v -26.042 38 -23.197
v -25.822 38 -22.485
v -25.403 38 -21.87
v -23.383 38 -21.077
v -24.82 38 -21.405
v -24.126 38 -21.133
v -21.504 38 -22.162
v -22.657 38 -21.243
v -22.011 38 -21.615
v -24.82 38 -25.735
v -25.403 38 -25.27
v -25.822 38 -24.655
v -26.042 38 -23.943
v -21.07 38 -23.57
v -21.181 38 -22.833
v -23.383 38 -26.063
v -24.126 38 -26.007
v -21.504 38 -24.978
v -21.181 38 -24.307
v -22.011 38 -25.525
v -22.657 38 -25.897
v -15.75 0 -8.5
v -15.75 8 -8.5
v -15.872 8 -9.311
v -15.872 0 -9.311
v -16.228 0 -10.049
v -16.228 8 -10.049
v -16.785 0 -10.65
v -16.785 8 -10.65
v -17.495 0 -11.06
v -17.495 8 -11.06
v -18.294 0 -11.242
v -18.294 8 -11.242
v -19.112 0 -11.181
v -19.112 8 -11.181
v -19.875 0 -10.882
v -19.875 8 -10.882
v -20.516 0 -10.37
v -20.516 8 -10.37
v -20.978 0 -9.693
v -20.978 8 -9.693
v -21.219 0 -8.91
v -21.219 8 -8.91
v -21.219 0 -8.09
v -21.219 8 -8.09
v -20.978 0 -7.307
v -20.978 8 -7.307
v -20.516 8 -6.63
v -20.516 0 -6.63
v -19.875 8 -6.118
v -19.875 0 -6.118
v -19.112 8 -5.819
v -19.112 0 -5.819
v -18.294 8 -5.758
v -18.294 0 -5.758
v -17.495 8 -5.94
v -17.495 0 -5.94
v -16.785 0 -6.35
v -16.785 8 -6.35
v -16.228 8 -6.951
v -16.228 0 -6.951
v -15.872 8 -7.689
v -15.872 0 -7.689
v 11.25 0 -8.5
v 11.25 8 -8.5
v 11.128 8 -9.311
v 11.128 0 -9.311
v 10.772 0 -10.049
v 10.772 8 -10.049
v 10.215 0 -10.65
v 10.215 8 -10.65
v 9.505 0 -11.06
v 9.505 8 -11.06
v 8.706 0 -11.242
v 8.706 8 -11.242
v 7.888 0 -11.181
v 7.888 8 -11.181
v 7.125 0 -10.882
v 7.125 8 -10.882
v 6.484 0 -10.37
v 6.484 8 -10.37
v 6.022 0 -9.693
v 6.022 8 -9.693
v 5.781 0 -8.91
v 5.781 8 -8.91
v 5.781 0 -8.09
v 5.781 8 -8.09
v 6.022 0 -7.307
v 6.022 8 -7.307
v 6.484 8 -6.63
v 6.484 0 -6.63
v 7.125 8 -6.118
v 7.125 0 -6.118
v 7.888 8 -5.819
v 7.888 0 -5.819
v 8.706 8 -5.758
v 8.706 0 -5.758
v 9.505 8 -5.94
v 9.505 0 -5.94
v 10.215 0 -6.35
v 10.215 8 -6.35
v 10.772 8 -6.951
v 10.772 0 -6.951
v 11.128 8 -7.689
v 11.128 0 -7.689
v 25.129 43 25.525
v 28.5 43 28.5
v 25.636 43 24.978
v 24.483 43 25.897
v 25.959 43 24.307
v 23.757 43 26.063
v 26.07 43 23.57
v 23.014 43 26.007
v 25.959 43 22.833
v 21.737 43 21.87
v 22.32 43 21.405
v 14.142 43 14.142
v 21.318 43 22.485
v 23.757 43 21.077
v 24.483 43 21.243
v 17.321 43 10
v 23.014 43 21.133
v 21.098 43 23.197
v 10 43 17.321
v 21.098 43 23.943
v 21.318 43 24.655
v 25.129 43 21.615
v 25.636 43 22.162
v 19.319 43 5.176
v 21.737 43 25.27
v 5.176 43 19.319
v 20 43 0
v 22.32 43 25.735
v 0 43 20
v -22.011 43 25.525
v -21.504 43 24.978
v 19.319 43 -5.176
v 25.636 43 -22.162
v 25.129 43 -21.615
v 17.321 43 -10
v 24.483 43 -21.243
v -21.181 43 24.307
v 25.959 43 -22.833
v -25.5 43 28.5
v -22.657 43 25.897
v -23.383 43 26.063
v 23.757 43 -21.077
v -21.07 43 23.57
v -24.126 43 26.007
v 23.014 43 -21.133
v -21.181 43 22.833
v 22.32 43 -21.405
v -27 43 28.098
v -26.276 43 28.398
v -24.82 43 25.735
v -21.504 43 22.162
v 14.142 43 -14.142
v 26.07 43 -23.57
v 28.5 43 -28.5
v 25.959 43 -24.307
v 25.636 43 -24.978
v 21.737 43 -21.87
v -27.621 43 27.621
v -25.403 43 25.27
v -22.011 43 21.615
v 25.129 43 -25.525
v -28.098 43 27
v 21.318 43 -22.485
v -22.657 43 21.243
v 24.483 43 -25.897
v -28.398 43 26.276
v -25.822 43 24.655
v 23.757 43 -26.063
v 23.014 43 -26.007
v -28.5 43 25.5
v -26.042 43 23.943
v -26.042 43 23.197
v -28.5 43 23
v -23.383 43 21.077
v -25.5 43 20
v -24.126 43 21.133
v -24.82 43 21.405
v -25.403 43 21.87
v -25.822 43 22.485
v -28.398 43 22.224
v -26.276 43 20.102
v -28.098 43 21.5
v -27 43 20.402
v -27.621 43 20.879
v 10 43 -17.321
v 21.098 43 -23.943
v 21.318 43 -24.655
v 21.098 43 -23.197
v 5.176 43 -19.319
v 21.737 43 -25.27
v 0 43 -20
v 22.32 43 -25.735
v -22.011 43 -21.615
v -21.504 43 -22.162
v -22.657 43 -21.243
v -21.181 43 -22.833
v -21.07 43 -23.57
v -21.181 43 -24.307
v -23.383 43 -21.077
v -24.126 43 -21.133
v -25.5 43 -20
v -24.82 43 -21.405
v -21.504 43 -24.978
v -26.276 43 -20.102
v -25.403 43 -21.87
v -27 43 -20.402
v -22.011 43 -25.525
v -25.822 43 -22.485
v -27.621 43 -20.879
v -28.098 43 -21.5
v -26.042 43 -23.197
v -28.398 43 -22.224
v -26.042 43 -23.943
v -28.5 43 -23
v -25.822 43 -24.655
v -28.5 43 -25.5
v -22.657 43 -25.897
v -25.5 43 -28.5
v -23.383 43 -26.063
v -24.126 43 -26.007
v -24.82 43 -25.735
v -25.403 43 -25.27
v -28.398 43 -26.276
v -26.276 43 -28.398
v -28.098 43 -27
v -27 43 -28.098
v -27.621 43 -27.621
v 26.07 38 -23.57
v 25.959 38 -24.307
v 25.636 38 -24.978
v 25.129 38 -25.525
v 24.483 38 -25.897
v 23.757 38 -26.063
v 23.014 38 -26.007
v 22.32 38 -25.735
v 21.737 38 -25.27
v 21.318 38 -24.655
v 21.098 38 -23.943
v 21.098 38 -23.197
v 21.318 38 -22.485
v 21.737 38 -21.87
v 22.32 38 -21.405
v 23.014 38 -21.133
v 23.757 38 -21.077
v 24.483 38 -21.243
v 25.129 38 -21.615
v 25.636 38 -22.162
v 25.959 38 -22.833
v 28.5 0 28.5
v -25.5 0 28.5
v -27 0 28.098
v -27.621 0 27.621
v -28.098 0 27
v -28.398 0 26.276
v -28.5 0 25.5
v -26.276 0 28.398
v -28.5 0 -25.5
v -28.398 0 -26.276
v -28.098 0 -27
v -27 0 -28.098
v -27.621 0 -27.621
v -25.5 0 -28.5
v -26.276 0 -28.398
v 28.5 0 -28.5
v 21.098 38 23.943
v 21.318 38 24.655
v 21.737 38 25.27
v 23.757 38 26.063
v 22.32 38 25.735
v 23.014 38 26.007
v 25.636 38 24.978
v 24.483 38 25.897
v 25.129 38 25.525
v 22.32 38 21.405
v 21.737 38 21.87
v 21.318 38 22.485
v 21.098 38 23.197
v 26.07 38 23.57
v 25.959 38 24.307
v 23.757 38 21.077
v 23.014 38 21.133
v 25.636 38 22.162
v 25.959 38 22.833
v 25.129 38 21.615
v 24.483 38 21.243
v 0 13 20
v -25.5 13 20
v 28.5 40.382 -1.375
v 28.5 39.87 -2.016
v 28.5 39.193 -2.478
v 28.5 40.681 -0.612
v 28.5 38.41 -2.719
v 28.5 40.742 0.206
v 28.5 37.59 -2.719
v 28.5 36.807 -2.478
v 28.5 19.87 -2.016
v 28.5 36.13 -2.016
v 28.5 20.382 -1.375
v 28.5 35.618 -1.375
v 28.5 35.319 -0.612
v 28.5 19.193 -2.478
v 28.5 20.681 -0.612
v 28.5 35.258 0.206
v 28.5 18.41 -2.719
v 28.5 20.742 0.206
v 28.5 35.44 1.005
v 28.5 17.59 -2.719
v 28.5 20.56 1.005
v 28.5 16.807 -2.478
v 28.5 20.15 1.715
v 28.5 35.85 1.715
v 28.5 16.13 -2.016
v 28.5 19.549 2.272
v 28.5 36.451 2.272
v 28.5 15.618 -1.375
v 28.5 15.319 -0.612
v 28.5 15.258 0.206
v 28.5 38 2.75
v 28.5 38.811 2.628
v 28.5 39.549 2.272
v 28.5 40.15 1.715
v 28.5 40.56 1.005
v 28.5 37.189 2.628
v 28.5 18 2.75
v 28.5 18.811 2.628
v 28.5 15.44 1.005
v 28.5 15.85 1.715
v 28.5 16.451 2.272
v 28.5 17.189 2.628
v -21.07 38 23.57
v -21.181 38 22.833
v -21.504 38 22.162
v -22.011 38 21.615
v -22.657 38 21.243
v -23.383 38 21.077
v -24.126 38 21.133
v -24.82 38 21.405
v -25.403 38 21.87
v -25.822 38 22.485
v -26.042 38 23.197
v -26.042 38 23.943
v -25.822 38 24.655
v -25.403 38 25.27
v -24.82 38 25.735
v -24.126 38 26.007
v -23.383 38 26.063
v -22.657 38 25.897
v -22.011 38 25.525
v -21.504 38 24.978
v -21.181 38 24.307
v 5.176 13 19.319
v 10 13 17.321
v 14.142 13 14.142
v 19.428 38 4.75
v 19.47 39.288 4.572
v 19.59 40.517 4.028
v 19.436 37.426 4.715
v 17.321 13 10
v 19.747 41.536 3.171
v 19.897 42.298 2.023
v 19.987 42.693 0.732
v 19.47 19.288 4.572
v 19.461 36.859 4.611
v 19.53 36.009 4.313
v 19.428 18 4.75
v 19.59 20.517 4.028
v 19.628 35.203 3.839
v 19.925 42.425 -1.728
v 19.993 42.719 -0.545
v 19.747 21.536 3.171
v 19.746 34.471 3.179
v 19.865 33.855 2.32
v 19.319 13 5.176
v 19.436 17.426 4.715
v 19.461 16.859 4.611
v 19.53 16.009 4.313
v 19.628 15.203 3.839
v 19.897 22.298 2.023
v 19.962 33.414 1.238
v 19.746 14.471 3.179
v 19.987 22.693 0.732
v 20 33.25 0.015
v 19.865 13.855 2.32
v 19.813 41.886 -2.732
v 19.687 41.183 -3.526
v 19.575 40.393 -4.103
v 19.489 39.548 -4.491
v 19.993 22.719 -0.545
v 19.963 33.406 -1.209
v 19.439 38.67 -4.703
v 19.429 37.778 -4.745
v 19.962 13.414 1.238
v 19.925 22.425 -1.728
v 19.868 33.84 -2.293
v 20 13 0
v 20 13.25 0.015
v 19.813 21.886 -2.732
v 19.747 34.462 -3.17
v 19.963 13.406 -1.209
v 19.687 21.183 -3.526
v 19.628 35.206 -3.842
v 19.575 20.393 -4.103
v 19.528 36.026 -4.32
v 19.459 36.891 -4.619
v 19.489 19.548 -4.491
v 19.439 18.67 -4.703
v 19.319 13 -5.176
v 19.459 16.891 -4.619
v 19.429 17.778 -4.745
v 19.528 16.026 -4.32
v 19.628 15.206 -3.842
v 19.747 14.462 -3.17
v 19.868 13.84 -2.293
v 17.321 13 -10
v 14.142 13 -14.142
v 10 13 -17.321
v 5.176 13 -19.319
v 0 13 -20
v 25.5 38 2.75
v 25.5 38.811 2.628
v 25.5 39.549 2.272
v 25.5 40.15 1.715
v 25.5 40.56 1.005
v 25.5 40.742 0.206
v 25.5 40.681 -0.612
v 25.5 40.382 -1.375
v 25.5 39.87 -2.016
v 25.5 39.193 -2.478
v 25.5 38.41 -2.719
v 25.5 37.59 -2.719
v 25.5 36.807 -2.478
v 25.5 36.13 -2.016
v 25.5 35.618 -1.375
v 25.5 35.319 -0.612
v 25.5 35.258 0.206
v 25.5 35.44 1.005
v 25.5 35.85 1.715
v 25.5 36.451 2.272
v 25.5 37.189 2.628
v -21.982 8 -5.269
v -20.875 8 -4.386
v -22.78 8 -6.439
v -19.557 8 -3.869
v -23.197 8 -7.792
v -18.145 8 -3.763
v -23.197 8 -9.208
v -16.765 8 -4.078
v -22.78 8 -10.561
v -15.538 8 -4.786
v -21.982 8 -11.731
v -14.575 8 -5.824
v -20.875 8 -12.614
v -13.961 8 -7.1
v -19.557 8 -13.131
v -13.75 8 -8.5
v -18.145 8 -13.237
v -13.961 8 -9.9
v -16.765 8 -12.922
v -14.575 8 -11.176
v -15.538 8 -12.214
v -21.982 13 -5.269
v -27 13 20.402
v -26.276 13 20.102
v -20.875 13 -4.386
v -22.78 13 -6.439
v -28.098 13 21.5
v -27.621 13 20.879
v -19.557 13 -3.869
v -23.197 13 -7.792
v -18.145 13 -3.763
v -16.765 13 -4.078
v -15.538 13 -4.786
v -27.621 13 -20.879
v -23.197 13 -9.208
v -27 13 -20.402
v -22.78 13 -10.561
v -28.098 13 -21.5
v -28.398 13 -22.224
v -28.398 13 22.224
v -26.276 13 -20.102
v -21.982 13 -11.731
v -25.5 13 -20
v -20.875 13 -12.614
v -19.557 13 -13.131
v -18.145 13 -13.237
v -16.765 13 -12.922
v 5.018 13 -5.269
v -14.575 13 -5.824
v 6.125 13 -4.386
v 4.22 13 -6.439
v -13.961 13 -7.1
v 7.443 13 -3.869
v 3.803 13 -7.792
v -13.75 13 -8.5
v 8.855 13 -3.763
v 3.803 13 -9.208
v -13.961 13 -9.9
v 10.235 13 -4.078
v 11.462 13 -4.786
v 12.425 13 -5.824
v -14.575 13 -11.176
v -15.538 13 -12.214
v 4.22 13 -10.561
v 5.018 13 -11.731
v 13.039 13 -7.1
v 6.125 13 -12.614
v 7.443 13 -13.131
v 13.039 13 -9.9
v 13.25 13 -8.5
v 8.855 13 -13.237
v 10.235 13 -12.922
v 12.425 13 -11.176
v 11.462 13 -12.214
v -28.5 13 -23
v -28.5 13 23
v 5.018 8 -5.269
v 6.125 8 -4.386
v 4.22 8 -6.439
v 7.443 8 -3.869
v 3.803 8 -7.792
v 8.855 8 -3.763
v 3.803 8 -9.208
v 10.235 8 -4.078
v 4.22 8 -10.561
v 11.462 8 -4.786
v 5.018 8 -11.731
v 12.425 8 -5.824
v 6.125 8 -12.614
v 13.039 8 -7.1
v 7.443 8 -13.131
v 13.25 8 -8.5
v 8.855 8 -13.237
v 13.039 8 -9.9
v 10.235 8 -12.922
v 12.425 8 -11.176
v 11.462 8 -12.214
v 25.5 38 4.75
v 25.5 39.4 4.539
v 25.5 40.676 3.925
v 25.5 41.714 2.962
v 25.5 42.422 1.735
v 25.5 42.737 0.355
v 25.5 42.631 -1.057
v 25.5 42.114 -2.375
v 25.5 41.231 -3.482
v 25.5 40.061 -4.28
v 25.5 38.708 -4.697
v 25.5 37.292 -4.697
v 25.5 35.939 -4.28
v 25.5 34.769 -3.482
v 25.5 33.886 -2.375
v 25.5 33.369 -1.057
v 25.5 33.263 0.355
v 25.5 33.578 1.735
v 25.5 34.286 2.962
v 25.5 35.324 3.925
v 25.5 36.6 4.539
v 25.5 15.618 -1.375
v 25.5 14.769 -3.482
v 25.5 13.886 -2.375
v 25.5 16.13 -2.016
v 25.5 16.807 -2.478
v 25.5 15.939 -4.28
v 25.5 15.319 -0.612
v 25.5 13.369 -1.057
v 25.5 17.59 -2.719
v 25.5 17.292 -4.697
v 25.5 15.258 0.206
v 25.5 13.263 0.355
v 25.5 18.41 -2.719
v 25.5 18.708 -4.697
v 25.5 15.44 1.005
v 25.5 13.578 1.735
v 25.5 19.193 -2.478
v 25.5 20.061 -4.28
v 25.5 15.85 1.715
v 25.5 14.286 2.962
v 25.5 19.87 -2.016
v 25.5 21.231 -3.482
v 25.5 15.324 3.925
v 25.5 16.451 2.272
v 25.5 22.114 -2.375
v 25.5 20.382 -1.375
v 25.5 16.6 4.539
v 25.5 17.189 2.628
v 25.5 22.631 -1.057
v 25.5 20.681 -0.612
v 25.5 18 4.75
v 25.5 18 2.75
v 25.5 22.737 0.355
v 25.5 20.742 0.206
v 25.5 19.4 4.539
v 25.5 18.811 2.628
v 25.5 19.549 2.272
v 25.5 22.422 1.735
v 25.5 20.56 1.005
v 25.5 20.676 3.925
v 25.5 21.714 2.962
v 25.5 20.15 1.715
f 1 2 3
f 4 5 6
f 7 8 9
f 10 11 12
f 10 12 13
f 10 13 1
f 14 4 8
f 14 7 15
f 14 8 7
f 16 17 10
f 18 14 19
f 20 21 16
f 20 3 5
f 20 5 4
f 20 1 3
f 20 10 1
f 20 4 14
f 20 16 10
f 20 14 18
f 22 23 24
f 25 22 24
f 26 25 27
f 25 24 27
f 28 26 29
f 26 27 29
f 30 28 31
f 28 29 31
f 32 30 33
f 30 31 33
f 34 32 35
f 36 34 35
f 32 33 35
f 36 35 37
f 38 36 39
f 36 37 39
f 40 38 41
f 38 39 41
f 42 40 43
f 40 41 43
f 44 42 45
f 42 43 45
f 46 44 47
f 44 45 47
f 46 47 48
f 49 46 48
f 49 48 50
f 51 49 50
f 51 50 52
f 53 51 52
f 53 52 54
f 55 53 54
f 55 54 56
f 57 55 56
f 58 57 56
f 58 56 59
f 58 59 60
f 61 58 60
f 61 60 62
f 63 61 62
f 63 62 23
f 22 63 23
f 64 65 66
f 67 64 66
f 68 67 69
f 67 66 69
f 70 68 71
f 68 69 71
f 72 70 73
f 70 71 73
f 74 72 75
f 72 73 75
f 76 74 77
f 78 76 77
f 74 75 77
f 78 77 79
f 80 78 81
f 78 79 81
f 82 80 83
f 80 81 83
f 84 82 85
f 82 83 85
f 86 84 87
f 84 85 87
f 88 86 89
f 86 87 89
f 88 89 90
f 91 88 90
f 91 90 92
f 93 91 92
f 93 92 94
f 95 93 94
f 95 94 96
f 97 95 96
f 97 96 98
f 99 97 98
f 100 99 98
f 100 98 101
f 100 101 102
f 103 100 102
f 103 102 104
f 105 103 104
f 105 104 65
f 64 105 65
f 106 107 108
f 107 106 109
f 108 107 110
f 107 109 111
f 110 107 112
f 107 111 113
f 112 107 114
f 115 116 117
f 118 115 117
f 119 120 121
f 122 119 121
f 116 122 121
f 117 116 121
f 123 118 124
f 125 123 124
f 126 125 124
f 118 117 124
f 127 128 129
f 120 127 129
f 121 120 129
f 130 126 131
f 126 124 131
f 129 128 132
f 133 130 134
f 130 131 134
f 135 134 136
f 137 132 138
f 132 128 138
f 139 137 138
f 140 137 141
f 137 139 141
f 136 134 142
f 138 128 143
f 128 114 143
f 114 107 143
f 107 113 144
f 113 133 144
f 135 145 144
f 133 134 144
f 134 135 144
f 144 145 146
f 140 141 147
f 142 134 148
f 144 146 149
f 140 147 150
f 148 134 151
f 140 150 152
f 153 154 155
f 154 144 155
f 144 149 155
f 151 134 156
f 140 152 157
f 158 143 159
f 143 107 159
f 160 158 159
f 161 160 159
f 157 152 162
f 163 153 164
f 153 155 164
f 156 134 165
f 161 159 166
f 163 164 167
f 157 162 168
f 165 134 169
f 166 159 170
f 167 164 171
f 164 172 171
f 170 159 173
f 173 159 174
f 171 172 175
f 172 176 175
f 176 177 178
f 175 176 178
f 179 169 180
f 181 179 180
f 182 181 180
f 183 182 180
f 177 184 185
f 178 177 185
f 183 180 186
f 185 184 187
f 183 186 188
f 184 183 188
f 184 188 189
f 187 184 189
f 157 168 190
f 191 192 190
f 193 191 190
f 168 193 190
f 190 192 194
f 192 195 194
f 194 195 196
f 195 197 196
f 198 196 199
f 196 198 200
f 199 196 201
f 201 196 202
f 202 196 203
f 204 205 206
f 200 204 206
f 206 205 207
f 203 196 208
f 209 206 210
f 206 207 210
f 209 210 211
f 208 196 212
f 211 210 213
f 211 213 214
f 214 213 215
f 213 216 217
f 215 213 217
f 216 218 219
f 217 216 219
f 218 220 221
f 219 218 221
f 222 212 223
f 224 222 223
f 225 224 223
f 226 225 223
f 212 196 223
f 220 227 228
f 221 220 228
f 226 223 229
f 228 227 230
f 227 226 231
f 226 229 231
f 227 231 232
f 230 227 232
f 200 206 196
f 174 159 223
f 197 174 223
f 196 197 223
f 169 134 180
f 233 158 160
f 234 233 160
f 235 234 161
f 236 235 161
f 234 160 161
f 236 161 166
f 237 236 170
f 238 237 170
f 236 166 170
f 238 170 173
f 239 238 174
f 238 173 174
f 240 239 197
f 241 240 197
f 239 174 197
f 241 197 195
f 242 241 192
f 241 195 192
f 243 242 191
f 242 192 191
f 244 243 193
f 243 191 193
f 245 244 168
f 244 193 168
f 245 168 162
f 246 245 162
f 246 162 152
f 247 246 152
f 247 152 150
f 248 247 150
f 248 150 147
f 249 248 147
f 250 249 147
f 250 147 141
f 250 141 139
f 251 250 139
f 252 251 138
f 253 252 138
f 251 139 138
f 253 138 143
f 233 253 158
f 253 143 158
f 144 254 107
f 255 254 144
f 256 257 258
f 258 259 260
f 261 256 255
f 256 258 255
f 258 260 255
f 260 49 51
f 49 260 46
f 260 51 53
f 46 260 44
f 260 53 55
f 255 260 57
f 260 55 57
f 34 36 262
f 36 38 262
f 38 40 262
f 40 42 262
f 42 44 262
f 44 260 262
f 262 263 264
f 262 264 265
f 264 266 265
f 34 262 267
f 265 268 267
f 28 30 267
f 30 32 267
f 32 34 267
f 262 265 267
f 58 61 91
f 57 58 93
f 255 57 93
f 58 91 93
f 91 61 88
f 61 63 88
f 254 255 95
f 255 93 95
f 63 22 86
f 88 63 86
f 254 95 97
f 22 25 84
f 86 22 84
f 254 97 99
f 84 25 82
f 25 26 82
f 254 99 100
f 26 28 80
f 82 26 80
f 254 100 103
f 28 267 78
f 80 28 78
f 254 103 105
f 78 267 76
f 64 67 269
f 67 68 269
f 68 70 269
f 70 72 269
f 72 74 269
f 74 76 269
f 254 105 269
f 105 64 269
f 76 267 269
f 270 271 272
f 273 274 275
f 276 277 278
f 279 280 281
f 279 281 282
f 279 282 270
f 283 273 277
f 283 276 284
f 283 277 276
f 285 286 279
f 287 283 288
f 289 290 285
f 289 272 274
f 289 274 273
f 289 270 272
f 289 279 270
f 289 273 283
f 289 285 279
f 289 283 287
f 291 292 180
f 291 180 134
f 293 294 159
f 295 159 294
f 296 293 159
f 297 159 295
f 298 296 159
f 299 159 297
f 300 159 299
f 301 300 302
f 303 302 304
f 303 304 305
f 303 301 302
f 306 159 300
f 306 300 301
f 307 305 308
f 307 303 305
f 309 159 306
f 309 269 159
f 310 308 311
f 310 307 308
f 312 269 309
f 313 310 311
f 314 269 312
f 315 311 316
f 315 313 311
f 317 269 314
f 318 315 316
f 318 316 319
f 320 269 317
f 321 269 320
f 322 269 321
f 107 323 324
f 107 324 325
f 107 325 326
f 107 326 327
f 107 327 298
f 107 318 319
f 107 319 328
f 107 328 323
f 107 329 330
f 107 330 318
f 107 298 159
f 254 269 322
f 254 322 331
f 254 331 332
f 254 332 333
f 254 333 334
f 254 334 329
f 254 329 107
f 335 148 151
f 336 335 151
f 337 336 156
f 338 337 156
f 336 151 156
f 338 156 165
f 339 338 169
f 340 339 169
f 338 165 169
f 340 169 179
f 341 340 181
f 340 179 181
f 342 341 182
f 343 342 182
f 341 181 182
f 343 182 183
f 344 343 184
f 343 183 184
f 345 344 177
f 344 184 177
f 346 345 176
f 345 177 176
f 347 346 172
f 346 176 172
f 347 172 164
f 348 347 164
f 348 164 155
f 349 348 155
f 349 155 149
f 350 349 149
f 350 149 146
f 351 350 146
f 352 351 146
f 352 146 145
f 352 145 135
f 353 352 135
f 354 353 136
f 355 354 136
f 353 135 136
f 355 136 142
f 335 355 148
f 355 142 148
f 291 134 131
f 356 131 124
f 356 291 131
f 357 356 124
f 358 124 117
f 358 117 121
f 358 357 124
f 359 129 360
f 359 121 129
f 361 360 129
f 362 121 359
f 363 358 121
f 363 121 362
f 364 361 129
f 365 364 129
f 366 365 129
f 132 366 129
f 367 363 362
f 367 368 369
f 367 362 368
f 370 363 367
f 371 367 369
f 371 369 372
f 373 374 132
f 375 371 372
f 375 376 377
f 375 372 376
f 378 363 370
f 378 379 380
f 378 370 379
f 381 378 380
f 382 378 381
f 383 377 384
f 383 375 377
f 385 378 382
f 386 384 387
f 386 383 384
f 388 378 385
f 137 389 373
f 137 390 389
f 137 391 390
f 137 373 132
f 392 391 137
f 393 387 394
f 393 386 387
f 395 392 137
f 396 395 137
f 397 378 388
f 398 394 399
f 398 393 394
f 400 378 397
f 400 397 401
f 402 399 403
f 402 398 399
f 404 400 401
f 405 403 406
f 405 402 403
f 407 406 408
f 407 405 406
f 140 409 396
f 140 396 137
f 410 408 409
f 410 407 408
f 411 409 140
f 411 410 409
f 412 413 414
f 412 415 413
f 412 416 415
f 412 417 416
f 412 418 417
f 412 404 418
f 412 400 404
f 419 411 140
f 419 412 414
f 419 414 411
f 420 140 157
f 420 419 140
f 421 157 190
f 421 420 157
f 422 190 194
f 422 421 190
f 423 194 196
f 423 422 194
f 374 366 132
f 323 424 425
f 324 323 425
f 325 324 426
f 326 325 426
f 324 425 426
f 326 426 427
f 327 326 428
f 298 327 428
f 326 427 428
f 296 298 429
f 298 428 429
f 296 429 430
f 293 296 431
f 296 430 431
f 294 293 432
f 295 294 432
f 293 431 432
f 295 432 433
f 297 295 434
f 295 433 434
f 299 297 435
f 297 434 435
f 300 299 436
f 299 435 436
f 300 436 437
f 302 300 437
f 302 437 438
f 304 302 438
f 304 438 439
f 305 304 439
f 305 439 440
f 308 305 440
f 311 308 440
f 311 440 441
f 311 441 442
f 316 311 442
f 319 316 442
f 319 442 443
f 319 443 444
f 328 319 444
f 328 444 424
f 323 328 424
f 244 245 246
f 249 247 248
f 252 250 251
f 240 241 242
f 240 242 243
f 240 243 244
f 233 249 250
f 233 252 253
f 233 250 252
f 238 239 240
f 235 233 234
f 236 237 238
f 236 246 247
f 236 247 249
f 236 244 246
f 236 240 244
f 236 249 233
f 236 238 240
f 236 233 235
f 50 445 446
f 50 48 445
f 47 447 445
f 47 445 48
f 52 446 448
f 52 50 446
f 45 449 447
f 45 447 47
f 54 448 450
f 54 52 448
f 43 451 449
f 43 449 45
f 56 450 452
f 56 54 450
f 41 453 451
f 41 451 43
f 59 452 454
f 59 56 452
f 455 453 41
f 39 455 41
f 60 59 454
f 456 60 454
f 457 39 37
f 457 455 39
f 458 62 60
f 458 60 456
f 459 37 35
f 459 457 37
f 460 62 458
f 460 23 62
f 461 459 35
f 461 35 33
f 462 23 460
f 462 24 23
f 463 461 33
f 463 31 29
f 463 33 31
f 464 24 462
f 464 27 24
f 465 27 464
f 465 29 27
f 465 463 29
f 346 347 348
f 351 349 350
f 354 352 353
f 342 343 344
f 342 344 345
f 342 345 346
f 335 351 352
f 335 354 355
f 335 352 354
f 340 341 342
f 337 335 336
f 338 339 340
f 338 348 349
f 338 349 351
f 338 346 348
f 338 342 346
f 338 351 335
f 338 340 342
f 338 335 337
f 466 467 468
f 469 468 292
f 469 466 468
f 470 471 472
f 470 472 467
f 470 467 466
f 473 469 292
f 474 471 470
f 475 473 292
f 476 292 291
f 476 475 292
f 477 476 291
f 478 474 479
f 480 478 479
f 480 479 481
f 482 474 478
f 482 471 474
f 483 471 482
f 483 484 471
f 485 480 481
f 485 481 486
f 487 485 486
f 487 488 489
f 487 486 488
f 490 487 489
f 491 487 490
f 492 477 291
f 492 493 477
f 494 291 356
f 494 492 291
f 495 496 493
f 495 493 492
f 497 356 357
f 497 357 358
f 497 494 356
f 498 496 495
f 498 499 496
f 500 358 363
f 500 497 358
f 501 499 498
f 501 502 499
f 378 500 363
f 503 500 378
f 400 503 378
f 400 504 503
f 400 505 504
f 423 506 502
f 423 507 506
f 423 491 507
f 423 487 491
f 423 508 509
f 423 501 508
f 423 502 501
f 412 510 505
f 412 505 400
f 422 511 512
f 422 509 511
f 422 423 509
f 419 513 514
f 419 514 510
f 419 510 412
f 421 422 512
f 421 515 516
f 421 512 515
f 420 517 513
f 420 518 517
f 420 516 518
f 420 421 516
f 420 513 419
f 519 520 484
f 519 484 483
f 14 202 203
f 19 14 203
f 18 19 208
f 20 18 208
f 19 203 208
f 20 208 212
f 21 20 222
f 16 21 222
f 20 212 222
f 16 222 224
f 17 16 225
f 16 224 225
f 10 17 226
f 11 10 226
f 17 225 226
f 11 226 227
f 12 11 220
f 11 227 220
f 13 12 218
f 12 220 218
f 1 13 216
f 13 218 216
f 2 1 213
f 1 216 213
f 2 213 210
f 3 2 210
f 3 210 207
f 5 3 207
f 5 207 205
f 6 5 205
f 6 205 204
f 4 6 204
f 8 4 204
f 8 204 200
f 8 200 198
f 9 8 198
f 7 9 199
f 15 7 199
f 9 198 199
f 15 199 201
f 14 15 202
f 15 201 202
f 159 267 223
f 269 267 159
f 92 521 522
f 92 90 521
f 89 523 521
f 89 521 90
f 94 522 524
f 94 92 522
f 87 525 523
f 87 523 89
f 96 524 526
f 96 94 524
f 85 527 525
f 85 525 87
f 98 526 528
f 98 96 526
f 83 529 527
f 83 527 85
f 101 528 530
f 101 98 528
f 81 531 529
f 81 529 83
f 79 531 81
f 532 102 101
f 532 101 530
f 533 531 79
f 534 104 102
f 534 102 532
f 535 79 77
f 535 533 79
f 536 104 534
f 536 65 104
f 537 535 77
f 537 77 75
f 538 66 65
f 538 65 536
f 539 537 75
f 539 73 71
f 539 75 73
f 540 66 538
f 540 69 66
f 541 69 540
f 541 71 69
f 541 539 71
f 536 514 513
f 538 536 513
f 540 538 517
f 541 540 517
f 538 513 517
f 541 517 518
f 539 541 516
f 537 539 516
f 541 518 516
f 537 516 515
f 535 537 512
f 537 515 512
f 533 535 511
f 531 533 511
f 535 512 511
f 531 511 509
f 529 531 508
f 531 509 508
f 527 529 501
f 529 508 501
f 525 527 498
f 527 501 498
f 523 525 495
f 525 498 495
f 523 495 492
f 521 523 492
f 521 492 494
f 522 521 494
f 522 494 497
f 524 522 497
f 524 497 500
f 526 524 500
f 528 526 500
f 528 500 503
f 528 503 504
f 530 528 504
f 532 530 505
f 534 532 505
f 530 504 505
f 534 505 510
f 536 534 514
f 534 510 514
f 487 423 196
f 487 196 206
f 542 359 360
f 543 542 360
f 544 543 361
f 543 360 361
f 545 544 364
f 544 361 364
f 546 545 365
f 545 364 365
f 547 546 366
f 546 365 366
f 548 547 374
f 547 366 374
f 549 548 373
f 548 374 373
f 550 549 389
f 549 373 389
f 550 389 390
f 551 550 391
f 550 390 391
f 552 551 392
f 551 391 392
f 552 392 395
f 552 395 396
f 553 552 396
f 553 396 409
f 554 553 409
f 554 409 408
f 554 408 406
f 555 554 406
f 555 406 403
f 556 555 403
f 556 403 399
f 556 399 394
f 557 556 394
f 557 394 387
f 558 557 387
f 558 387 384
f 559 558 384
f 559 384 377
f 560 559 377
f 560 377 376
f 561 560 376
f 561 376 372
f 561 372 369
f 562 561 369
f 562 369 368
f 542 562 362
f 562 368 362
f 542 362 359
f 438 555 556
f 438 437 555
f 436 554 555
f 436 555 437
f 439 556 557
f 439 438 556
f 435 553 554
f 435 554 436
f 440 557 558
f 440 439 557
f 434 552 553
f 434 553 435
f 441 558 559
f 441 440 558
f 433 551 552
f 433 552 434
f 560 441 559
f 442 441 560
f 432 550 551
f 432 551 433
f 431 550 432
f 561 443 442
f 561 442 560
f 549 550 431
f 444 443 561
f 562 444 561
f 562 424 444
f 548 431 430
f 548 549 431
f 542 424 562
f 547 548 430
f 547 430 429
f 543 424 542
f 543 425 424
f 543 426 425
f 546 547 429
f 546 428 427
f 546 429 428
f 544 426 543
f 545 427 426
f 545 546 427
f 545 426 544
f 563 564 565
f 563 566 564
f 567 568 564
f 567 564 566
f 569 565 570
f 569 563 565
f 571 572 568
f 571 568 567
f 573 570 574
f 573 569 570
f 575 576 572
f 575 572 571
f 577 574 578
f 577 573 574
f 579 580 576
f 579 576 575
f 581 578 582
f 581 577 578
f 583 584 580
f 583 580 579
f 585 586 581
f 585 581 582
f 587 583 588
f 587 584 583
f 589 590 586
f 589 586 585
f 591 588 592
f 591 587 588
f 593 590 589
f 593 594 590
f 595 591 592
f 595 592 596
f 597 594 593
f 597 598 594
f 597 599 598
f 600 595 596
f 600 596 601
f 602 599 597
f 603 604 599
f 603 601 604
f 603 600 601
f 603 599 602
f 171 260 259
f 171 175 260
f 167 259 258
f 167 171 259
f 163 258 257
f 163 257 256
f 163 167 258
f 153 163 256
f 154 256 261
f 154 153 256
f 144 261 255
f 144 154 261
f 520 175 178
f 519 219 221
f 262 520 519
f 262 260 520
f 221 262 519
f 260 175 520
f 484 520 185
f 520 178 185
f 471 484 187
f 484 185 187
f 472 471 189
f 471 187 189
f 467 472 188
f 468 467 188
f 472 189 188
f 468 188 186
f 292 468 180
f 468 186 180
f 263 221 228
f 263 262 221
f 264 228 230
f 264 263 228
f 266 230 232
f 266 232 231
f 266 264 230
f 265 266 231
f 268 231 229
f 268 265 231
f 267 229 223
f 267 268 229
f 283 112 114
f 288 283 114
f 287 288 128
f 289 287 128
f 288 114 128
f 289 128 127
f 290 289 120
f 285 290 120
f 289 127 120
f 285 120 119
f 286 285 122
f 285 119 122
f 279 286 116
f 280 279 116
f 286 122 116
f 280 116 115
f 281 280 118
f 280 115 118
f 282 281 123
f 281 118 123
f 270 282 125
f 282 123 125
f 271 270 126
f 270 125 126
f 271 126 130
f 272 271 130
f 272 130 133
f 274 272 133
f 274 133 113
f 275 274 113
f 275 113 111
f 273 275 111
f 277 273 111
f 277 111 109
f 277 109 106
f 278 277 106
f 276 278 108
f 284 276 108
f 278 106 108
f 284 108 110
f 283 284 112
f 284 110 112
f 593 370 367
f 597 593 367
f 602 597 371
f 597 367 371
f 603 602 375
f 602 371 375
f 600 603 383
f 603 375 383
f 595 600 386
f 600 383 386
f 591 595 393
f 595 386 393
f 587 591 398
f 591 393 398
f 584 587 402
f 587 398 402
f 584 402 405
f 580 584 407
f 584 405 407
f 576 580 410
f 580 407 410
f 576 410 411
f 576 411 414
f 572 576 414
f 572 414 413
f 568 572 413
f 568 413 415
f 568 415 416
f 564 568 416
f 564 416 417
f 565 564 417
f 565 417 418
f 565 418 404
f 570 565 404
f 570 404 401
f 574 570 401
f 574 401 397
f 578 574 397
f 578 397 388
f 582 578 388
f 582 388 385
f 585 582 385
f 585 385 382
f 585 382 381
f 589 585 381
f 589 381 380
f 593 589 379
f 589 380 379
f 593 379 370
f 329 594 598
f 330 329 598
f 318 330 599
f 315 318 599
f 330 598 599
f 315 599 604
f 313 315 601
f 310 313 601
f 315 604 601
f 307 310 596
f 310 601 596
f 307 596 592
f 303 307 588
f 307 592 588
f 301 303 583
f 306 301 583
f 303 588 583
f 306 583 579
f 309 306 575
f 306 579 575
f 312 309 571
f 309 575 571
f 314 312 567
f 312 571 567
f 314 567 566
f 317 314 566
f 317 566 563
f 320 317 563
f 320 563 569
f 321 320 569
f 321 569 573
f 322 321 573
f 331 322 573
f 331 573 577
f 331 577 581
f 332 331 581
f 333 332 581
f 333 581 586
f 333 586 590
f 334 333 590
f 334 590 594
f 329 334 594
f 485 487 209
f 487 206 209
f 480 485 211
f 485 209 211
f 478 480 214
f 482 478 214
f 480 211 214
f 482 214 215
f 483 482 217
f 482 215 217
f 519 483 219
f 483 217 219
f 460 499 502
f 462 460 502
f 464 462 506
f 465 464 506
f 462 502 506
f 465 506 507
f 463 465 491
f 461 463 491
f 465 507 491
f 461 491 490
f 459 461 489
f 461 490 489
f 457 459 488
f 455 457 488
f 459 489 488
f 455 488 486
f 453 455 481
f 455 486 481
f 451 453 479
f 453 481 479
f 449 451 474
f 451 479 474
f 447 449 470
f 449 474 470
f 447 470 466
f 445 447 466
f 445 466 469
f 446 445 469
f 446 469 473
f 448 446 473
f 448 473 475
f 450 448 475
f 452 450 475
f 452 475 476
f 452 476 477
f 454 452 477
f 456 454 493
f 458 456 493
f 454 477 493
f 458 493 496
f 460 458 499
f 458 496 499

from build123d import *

# Parameters (mm, degrees)
SKETCH1_W           = 57
SKETCH1_H           = 57
BOSS_EXTRUDE1_DEPTH = 13
BOSS_EXTRUDE2_DEPTH = 30
SKETCH3_R           = 2.75
CUT_EXTRUDE1_DEPTH  = 57
SKETCH4_R           = 4.75
CUT_EXTRUDE6_DEPTH  = 54
SKETCH5_R           = 2.5
CUT_EXTRUDE7_DEPTH  = 5
SKETCH6_R           = 2.75
CUT_EXTRUDE8_DEPTH  = 14
SKETCH7_R           = 4.75
CUT_EXTRUDE9_DEPTH  = 5
FILLET1_R           = 3


with BuildPart() as part:
    # Sketch1 → Boss-Extrude1 (new body)
    with BuildSketch(Plane(origin=(0, 0, 0), x_dir=(1, 0, 0), z_dir=(0, 1, 0))):
        Rectangle(SKETCH1_W, SKETCH1_H)
    extrude(amount=BOSS_EXTRUDE1_DEPTH)

    # Sketch2 → Boss-Extrude2 (add)
    with BuildSketch(Plane(origin=(0, 13, 0), x_dir=(1, 0, 0), z_dir=(0, 1, 0))):
        with BuildLine():
            Line((0, 20), (-28.5, 20))
            Line((-28.5, 20), (-28.5, 28.5))
            Line((-28.5, 28.5), (28.5, 28.5))
            Line((28.5, 28.5), (28.5, -28.5))
            Line((28.5, -28.5), (-28.5, -28.5))
            Line((-28.5, -28.5), (-28.5, -20))
            Line((-28.5, -20), (0, -20))
            ThreePointArc((0, -20), (20, 0), (0, 20))
        make_face()
    extrude(amount=BOSS_EXTRUDE2_DEPTH)

    # Sketch3 → Cut-Extrude1 (cut)
    with BuildSketch(Plane.ZY.offset(28.5)):
        with Locations((0, 18)):
            Circle(SKETCH3_R)
        with Locations((0, 38)):
            Circle(SKETCH3_R)
    extrude(amount=-CUT_EXTRUDE1_DEPTH, mode=Mode.SUBTRACT)

    # Sketch4 → Cut-Extrude6 (cut)
    with BuildSketch(Plane.ZY.offset(28.5)):
        with Locations((0, 38)):
            Circle(SKETCH4_R)
        with Locations((0, 18)):
            Circle(SKETCH4_R)
    extrude(amount=-CUT_EXTRUDE6_DEPTH, mode=Mode.SUBTRACT)

    # Sketch5 → Cut-Extrude7 (cut)
    with BuildSketch(Plane(origin=(0, 43, 0), x_dir=(1, 0, 0), z_dir=(0, 1, 0))):
        with Locations((-23.57, 23.57)):
            Circle(SKETCH5_R)
        with Locations((23.57, 23.57)):
            Circle(SKETCH5_R)
        with Locations((23.57, -23.57)):
            Circle(SKETCH5_R)
        with Locations((-23.57, -23.57)):
            Circle(SKETCH5_R)
    extrude(amount=-CUT_EXTRUDE7_DEPTH, mode=Mode.SUBTRACT)

    # Sketch6 → Cut-Extrude8 (cut, through all)
    with BuildSketch(Plane(origin=(0, 13, 0), x_dir=(1, 0, 0), z_dir=(0, 1, 0))):
        with Locations((-18.5, 8.5)):
            Circle(SKETCH6_R)
        with Locations((8.5, 8.5)):
            Circle(SKETCH6_R)
    extrude(amount=-CUT_EXTRUDE8_DEPTH, mode=Mode.SUBTRACT)

    # Sketch7 → Cut-Extrude9 (cut)
    with BuildSketch(Plane(origin=(0, 13, 0), x_dir=(1, 0, 0), z_dir=(0, 1, 0))):
        with Locations((-18.5, 8.5)):
            Circle(SKETCH7_R)
        with Locations((8.5, 8.5)):
            Circle(SKETCH7_R)
    extrude(amount=-CUT_EXTRUDE9_DEPTH, mode=Mode.SUBTRACT)

    # Fillet1
    fillet1_edges = [part.edges().sort_by_distance(p)[0] for p in [
        (-28.5, 28, -20),
        (-28.5, 28, 20),
        (-28.5, 21.5, -28.5),
        (-28.5, 21.5, 28.5),
    ]]
    fillet(fillet1_edges, radius=FILLET1_R)


solid = part.part
